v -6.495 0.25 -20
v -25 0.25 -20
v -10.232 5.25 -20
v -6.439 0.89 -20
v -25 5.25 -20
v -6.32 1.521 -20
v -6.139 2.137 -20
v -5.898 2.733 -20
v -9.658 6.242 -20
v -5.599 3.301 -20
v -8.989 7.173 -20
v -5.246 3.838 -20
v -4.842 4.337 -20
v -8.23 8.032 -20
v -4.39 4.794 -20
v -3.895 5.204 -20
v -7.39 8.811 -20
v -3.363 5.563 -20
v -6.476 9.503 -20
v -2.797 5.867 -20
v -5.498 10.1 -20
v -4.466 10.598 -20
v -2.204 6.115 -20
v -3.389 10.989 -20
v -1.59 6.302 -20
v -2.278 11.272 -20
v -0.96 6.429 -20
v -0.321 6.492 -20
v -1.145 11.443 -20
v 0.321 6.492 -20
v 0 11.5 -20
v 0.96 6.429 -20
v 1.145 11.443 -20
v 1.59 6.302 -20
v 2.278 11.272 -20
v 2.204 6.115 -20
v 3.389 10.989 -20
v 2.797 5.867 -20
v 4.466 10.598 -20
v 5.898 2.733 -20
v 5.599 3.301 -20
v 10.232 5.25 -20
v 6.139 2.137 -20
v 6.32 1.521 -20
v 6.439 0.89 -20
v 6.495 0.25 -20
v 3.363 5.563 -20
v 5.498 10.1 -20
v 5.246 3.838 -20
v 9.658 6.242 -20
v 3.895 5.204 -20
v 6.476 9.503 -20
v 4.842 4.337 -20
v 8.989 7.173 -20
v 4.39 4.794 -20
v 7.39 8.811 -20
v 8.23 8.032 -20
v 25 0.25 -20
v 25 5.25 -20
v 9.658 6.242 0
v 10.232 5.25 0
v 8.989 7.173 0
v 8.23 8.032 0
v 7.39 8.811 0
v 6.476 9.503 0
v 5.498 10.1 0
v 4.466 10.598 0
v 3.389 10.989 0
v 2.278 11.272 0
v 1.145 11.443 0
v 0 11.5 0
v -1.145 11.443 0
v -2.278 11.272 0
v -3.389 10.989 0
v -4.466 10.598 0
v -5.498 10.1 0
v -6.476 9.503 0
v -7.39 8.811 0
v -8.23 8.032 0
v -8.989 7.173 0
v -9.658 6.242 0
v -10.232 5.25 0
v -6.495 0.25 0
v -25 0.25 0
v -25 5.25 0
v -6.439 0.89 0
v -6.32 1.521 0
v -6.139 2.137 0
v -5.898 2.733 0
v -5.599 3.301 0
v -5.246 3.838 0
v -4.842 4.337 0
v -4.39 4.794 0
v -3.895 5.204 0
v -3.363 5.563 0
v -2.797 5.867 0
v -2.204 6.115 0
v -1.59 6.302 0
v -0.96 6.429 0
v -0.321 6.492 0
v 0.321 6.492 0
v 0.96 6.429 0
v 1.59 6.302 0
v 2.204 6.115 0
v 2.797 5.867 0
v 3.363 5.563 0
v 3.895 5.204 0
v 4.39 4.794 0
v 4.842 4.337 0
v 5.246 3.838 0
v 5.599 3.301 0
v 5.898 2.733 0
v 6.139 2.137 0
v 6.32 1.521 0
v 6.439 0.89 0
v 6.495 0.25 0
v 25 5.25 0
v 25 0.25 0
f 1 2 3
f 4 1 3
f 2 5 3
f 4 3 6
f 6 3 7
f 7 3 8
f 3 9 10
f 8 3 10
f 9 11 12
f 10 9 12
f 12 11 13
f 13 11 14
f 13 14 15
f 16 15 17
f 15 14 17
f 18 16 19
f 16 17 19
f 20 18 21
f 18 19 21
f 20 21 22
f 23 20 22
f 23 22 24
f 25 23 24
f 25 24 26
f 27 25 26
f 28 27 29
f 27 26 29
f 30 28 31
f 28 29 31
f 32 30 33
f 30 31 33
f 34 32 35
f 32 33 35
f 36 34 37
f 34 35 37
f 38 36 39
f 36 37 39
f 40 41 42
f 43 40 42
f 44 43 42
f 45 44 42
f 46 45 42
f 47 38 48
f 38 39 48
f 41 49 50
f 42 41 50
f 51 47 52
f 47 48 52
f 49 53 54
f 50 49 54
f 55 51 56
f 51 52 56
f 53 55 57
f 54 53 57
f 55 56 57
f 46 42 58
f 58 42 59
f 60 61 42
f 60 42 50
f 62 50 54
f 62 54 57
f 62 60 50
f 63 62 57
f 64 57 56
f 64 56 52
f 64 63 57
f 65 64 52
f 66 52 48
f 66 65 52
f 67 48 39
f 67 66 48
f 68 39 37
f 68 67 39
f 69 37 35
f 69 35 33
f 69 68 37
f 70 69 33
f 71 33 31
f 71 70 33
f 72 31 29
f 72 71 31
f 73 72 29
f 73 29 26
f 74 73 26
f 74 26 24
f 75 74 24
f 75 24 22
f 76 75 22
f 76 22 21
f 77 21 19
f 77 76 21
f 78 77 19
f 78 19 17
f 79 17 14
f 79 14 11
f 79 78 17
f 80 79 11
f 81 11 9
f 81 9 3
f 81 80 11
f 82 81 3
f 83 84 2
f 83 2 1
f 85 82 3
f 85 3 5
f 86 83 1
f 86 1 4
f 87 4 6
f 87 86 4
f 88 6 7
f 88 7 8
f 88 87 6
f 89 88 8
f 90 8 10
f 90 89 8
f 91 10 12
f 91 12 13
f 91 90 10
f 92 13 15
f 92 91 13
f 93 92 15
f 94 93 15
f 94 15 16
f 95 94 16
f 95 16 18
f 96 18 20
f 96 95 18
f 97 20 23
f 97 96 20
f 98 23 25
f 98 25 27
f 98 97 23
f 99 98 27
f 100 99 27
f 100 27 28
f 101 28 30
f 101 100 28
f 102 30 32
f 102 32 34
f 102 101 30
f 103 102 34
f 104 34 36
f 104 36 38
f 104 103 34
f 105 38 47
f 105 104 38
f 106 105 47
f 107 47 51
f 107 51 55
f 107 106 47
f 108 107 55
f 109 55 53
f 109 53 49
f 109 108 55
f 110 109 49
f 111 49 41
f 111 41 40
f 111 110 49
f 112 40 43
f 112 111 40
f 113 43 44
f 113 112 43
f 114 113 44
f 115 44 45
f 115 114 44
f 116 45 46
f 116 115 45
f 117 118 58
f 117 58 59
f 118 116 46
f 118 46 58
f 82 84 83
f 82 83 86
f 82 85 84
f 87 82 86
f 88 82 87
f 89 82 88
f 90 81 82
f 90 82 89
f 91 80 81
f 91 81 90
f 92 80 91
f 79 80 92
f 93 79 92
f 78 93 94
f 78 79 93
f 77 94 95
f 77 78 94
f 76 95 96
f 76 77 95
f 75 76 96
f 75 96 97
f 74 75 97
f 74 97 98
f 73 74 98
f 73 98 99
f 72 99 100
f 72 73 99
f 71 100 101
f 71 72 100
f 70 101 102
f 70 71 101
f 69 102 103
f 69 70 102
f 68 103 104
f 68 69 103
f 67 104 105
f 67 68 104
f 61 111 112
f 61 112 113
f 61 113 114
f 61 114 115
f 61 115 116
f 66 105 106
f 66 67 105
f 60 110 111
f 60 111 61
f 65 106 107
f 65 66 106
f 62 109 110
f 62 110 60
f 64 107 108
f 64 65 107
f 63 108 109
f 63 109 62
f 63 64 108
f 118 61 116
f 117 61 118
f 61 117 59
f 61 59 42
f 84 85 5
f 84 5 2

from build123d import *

# Parameters (mm, degrees)
BOSS_EXTRUDE1_DEPTH = 20


with BuildPart() as part:
    # Sketch1 → Boss-Extrude1 (new body)
    with BuildSketch(Plane.XY):
        with BuildLine():
            Line((-25, 0.25), (-11.497282288, 0.25))
            Line((-11.497282288, 0.25), (-6.495190528, 0.25))
            ThreePointArc((-6.495190528, 0.25), (0, 6.5), (6.495190528, 0.25))
            Line((6.495190528, 0.25), (11.497282288, 0.25))
            Line((11.497282288, 0.25), (25, 0.25))
            Line((25, 0.25), (25, 5.25))
            Line((25, 5.25), (10.231690965, 5.25))
            ThreePointArc((10.231690965, 5.25), (0, 11.5), (-10.231690965, 5.25))
            Line((-10.231690965, 5.25), (-25, 5.25))
            Line((-25, 5.25), (-25, 0.25))
        make_face()
    extrude(amount=-BOSS_EXTRUDE1_DEPTH)


solid = part.part
